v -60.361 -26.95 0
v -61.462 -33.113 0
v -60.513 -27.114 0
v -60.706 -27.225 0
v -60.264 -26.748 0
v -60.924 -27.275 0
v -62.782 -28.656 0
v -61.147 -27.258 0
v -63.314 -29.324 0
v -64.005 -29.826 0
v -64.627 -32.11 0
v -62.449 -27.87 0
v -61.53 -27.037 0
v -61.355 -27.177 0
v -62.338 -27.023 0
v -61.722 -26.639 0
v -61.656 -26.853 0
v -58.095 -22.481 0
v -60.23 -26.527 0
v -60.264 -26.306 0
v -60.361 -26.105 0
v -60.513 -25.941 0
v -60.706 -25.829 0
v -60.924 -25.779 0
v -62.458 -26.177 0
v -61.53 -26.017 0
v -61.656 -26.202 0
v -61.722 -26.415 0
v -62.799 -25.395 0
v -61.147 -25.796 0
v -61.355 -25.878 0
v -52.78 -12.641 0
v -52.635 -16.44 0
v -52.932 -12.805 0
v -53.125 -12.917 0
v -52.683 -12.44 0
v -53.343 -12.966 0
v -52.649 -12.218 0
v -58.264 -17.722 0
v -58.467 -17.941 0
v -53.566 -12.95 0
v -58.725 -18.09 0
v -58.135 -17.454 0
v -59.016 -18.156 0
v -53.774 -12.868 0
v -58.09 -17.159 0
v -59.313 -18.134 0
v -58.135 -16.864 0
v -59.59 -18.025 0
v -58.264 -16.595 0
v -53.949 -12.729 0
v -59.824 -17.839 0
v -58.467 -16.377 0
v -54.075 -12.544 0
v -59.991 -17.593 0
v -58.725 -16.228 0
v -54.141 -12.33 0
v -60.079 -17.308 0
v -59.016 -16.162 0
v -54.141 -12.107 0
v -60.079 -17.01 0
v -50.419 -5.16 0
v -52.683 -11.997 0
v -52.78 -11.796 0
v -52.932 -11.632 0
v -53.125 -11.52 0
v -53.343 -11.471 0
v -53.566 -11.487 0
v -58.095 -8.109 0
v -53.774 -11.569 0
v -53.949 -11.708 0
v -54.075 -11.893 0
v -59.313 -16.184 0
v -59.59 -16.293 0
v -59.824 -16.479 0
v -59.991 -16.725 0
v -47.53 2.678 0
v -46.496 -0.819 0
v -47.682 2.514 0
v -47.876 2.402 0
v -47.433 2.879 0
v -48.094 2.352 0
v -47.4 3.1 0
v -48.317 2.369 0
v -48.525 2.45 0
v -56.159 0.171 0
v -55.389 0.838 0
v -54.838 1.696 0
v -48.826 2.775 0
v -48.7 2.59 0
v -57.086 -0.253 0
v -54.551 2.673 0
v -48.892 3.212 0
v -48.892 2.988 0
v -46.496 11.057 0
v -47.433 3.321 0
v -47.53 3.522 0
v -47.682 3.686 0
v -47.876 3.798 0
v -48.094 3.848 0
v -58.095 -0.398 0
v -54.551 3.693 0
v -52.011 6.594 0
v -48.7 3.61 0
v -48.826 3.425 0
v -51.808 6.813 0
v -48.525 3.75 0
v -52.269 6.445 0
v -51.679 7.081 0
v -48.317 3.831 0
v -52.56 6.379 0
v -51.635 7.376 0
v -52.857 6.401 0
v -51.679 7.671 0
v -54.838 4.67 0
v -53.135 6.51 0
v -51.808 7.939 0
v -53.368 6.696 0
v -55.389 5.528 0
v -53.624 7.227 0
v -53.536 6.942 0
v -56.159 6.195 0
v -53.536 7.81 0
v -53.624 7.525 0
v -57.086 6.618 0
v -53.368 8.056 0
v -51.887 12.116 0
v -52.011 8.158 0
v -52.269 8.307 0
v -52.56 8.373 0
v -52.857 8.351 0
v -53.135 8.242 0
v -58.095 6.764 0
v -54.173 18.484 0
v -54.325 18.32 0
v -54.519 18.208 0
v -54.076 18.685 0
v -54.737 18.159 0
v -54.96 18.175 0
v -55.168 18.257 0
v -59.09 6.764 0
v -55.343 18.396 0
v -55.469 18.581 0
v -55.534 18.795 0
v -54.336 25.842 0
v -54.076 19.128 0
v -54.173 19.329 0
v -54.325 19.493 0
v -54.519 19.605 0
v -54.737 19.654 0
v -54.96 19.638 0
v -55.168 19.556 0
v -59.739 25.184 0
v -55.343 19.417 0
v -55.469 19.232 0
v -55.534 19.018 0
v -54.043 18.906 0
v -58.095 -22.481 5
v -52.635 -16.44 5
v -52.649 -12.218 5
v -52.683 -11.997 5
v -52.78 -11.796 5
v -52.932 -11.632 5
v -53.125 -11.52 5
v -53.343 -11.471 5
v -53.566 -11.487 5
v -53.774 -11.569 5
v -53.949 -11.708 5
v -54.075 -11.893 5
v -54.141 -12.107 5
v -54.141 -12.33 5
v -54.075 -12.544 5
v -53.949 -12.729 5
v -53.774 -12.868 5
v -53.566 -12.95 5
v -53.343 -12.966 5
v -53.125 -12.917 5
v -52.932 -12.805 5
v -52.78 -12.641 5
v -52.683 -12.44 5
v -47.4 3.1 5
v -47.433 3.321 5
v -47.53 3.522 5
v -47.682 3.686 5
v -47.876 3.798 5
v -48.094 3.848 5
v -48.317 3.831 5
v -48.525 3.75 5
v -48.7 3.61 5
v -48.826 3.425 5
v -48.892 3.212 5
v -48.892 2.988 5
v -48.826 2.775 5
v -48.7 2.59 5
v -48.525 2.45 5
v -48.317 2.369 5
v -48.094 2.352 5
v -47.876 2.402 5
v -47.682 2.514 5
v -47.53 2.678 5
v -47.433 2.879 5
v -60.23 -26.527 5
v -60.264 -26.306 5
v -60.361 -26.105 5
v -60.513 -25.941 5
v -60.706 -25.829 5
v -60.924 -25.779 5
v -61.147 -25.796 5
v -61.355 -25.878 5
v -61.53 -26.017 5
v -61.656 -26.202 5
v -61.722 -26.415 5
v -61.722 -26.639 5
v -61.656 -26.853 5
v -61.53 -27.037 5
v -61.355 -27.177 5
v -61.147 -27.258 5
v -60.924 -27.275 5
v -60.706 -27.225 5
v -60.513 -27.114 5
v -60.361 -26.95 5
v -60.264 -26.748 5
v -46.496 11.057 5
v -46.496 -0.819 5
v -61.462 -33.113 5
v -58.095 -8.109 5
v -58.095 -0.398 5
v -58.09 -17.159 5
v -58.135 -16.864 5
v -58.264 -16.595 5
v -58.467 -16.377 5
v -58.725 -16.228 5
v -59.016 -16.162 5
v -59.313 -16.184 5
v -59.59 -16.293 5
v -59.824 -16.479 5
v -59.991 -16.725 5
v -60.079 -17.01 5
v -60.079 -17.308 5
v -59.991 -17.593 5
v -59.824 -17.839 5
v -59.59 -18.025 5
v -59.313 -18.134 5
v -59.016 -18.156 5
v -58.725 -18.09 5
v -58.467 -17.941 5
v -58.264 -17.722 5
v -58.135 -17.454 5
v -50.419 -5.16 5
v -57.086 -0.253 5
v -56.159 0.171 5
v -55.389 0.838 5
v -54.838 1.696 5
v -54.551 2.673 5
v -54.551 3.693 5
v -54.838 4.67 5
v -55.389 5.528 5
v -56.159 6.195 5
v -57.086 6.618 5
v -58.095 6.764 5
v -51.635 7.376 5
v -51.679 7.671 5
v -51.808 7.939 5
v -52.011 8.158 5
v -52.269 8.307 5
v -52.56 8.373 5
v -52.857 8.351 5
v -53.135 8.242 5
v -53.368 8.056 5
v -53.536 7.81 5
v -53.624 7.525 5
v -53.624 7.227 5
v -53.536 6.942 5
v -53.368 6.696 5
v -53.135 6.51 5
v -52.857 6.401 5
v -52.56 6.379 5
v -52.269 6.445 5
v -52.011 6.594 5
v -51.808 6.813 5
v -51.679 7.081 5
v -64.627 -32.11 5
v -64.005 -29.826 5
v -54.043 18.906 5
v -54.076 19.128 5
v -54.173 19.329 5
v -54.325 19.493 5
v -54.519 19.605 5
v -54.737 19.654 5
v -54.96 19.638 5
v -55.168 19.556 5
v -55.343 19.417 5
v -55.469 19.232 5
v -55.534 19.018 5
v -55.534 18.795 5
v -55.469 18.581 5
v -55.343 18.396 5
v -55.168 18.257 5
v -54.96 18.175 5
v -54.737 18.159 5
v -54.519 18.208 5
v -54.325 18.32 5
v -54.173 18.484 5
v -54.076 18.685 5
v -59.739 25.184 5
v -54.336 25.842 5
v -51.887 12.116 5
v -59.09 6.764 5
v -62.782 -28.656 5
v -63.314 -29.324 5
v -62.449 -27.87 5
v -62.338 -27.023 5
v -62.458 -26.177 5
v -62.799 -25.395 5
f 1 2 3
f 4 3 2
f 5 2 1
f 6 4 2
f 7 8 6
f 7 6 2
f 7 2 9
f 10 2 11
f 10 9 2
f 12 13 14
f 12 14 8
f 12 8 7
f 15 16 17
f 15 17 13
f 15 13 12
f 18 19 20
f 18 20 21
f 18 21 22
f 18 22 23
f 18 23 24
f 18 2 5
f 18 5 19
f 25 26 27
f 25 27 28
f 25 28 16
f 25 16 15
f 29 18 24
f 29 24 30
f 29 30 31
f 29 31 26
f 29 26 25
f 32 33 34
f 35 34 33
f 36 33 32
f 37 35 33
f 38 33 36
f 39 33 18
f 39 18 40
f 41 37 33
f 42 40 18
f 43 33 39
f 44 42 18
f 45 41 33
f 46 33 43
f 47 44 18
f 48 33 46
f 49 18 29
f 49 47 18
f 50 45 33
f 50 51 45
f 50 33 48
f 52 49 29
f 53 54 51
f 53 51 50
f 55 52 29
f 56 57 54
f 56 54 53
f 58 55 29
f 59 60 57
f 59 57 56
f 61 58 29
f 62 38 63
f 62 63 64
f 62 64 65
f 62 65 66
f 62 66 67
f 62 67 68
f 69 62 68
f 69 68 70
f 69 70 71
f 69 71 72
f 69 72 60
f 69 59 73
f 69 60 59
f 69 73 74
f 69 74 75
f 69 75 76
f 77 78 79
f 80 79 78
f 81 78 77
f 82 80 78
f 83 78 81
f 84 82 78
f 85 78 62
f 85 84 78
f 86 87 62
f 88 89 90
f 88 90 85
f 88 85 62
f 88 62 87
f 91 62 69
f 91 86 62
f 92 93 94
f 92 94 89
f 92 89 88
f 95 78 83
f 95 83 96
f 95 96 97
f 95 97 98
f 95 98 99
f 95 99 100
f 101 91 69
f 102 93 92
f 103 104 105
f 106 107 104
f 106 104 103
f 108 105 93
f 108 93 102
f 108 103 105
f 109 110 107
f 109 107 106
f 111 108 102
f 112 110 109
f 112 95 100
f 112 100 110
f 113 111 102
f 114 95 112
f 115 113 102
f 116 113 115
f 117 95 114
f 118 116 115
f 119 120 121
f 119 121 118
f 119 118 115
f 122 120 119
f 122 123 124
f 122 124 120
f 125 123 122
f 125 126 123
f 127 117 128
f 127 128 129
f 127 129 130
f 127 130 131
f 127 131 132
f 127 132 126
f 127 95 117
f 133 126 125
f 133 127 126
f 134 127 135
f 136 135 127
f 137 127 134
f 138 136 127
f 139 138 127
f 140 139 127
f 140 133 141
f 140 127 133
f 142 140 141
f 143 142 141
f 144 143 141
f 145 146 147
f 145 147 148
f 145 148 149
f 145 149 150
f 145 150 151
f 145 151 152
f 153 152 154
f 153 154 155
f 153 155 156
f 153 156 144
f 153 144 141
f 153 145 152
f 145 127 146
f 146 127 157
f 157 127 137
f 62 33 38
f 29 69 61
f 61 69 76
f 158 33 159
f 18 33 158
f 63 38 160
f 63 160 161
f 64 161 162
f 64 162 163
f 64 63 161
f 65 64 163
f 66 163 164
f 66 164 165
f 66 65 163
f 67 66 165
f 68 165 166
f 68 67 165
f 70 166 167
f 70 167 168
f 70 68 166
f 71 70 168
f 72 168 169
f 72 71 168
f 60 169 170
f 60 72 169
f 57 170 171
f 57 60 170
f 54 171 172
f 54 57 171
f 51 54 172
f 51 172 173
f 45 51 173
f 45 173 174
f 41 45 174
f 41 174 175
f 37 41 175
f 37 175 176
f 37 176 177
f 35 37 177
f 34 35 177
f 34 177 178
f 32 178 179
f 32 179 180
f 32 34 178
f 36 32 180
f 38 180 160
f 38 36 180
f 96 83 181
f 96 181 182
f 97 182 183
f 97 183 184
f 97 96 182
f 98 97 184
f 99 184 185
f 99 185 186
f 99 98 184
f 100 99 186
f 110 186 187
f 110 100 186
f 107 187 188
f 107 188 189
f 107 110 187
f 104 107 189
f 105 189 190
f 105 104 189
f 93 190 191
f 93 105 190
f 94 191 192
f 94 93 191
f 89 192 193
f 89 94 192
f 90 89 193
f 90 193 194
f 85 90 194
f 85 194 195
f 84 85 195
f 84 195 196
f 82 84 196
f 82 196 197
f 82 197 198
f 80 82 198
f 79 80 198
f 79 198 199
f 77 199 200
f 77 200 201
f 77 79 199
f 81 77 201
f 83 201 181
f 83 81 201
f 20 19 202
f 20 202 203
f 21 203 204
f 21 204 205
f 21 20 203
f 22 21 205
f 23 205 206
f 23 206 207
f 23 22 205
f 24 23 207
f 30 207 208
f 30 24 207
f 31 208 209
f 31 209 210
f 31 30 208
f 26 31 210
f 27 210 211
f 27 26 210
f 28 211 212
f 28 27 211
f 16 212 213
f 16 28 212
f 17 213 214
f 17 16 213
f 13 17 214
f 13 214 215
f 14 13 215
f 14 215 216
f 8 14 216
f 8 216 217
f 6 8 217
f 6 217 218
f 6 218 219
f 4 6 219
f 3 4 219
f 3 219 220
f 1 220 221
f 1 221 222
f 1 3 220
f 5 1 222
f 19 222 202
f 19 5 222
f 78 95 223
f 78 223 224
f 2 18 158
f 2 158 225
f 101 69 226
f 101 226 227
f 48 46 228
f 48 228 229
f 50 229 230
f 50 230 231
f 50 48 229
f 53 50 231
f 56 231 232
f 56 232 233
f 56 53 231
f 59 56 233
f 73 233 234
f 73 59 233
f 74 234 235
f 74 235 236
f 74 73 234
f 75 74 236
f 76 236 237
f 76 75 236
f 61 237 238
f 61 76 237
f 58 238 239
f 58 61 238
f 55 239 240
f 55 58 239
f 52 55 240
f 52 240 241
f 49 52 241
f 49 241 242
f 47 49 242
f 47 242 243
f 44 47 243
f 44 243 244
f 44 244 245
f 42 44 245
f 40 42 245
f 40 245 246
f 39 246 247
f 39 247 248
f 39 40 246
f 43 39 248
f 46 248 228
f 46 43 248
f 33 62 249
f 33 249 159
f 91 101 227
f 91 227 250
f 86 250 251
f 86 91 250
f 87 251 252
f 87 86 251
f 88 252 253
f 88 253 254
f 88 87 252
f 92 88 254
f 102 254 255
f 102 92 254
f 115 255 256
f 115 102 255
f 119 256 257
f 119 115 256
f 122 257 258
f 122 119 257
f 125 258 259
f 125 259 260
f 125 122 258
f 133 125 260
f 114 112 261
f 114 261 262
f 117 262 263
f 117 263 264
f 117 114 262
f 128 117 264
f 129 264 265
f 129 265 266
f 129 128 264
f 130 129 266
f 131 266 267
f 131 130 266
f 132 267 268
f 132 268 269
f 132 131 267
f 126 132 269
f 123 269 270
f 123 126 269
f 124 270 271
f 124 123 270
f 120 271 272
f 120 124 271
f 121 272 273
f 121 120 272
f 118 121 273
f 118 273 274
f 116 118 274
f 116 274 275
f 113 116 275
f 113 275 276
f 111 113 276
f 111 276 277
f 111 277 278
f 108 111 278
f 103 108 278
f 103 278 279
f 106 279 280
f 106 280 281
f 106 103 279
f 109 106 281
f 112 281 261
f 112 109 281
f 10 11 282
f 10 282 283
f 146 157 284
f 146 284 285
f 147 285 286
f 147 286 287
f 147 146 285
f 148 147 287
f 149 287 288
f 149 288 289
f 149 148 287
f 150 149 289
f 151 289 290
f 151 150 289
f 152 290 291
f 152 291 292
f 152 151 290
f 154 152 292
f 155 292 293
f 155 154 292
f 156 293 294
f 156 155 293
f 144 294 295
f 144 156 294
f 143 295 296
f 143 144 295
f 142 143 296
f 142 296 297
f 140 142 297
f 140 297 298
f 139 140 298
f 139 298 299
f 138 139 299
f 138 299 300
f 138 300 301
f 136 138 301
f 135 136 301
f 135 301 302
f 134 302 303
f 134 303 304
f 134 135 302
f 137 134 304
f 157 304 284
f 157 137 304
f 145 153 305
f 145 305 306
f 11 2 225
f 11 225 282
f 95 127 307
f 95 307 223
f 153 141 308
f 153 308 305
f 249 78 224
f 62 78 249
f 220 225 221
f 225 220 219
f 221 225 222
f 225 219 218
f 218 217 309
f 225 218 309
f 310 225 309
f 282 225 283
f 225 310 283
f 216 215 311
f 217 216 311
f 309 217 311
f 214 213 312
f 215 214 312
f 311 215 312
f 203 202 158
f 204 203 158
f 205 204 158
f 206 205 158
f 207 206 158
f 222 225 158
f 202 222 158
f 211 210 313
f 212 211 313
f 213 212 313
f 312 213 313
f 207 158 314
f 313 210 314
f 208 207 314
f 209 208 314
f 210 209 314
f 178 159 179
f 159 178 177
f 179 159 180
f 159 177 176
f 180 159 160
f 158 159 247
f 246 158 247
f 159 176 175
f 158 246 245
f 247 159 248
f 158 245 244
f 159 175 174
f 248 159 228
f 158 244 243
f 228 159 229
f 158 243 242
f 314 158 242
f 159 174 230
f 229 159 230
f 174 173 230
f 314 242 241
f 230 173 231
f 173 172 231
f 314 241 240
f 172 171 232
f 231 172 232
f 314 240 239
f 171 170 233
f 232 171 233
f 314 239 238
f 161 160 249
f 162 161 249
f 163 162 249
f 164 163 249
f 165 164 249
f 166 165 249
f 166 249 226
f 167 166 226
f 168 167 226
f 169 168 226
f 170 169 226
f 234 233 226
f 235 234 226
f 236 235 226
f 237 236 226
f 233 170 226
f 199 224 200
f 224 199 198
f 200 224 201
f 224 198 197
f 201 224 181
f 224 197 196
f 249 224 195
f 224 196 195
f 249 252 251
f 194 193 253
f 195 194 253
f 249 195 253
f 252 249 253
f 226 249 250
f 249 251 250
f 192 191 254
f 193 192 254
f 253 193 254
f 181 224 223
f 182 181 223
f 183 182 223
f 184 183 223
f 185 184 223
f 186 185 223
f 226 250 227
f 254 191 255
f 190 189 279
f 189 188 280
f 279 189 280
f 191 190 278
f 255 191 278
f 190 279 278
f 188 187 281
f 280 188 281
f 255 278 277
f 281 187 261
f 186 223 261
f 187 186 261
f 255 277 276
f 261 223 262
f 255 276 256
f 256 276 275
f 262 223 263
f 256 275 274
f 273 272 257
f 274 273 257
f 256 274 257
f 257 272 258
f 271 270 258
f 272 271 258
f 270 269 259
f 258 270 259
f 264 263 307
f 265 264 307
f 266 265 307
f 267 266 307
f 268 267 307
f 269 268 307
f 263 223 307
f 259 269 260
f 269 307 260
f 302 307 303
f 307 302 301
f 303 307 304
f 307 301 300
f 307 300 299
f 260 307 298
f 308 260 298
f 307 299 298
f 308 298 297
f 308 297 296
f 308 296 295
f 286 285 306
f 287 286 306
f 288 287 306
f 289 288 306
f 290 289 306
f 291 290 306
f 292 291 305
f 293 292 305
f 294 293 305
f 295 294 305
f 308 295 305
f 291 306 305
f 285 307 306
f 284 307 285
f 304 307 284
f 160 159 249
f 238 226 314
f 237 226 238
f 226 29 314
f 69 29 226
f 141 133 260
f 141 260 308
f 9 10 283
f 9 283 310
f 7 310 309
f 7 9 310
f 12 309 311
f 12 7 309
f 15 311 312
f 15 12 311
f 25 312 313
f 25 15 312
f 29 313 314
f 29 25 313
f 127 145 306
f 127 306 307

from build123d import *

# Parameters (mm, degrees)
SKETCH1_R           = 0.75
SKETCH1_R_2         = 1
BOSS_EXTRUDE1_DEPTH = 5
SKETCH2_R           = 3.161990297
CUT_EXTRUDE3_DEPTH  = 6


with BuildPart() as part:
    # Sketch1 → Boss-Extrude1 (new body)
    with BuildSketch(Plane.XY):
        with BuildLine():
            Line((-54.335741925, 25.84189954), (-51.886829877, 12.115657968))
            Line((-51.886829877, 12.115657968), (-46.495560397, 11.056658606))
            Line((-46.495560397, 11.056658606), (-46.495560397, -0.8192261))
            Line((-46.495560397, -0.8192261), (-50.419003961, -5.159962771))
            Line((-50.419003961, -5.159962771), (-52.634709942, -16.439920489))
            Line((-52.634709942, -16.439920489), (-58.094962161, -22.48091908))
            Line((-58.094962161, -22.48091908), (-61.461861486, -33.112780309))
            Line((-61.461861486, -33.112780309), (-64.627062483, -32.110424007))
            Line((-64.627062483, -32.110424007), (-58.094962161, -8.109055729))
            Line((-58.094962161, -8.109055729), (-58.094962161, -0.397611229))
            ThreePointArc((-58.094962161, -0.397611229), (-54.514396766, 3.182954166), (-58.094962161, 6.763519562))
            Line((-58.094962161, 6.763519562), (-59.090495064, 6.763519562))
            Line((-59.090495064, 6.763519562), (-59.738806897, 25.184479172))
            Line((-59.738806897, 25.184479172), (-54.335741925, 25.84189954))
        make_face()
        with Locations((-54.792818894, 18.90647511)):
            Circle(SKETCH1_R, mode=Mode.SUBTRACT)
        with Locations((-48.15, 3.1)):
            Circle(SKETCH1_R, mode=Mode.SUBTRACT)
        with Locations((-53.399319926, -12.218458076)):
            Circle(SKETCH1_R, mode=Mode.SUBTRACT)
        with Locations((-60.980346807, -26.52714596)):
            Circle(SKETCH1_R, mode=Mode.SUBTRACT)
        with Locations((-52.634709942, 7.375968546)):
            Circle(SKETCH1_R_2, mode=Mode.SUBTRACT)
        with Locations((-59.090495064, -17.158775628)):
            Circle(SKETCH1_R_2, mode=Mode.SUBTRACT)
    extrude(amount=BOSS_EXTRUDE1_DEPTH)

    # Sketch2 → Cut-Extrude3 (cut, through all)
    with BuildSketch(Plane.XY):
        with Locations((-65.5, -27.039327647)):
            Circle(SKETCH2_R)
    extrude(amount=CUT_EXTRUDE3_DEPTH, mode=Mode.SUBTRACT)


solid = part.part
